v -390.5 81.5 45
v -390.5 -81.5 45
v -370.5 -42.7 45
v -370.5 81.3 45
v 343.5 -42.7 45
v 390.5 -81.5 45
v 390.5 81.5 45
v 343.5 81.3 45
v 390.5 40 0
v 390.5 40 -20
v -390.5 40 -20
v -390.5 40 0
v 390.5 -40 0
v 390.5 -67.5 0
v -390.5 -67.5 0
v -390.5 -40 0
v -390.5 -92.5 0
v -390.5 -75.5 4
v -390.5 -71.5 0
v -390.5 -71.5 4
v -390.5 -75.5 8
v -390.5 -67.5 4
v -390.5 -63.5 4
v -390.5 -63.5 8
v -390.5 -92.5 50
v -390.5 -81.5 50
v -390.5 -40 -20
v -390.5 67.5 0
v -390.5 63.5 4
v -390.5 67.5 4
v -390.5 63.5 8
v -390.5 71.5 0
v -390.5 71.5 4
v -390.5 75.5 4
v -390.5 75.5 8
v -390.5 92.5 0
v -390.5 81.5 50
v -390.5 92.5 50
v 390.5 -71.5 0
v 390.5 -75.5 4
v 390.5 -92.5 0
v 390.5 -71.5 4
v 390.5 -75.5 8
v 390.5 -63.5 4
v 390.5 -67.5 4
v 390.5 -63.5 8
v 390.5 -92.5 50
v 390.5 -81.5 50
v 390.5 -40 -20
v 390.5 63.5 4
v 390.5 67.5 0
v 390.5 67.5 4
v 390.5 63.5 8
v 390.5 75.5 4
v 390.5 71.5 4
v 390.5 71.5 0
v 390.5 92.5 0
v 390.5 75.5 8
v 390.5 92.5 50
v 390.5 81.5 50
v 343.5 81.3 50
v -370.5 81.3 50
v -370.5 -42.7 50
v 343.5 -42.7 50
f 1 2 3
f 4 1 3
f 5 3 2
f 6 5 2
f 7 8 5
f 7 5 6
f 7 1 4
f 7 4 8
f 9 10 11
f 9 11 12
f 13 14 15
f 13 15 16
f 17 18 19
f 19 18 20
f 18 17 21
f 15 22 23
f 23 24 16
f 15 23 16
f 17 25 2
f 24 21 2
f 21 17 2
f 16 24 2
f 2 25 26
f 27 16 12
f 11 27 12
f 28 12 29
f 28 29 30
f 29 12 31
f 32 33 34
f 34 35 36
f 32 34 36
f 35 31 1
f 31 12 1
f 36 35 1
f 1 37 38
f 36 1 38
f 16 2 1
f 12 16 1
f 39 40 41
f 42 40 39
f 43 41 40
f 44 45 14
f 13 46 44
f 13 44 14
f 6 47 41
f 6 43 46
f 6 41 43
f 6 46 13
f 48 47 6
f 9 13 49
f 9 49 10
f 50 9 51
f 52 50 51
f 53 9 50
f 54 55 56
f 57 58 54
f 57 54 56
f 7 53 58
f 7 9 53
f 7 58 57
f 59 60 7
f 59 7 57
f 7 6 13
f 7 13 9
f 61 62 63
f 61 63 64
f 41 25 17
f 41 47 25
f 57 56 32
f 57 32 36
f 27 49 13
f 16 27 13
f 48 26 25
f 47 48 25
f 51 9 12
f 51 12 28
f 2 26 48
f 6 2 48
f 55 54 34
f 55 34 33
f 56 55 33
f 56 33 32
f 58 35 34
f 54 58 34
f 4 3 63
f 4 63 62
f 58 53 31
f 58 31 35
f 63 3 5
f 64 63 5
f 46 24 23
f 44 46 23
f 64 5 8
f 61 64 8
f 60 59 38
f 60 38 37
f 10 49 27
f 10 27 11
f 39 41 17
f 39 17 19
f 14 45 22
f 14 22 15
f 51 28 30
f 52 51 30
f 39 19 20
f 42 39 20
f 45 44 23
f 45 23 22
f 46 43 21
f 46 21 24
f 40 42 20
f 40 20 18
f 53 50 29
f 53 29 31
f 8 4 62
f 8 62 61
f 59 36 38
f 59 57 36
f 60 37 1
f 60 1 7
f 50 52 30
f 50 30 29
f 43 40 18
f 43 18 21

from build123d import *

# Parameters (mm, degrees)
F0_W     = 80
F0_H     = 20
F1_DEPTH = 390.5
F2_W     = 781
F2_H     = 163
F3_DEPTH = 5
F4_W     = 714
F4_H     = 124
F5_DEPTH = 5


with BuildPart() as f1:
    # F0 (on Right) → F1 (new body, symmetric)
    with BuildSketch(Plane.YZ):
        Polygon((-92.5, 50), (-92.5, 0), (-71.5, 0), (-71.5, 4), (-75.5, 4), (-75.5, 8), (-63.5, 8), (-63.5, 4), (-67.5, 4), (-67.5, 0), (-40, 0), (40, 0), (67.5, 0), (67.5, 4), (63.5, 4), (63.5, 8), (75.5, 8), (75.5, 4), (71.5, 4), (71.5, 0), (92.5, 0), (92.5, 50), align=None)
        with Locations((0, -10)):
            Rectangle(F0_W, F0_H)
    extrude(amount=F1_DEPTH, both=True)

    # F2 (on face) → F3 (cut)
    with BuildSketch(Plane.XY.offset(50)):
        Rectangle(F2_W, F2_H)
    extrude(amount=-F3_DEPTH, mode=Mode.SUBTRACT)

    # F4 (on face) → F5 (join)
    with BuildSketch(Plane.XY.offset(45)):
        with Locations((-13.5, 19.3)):
            Rectangle(F4_W, F4_H)
    extrude(amount=F5_DEPTH)


solid = f1.part
